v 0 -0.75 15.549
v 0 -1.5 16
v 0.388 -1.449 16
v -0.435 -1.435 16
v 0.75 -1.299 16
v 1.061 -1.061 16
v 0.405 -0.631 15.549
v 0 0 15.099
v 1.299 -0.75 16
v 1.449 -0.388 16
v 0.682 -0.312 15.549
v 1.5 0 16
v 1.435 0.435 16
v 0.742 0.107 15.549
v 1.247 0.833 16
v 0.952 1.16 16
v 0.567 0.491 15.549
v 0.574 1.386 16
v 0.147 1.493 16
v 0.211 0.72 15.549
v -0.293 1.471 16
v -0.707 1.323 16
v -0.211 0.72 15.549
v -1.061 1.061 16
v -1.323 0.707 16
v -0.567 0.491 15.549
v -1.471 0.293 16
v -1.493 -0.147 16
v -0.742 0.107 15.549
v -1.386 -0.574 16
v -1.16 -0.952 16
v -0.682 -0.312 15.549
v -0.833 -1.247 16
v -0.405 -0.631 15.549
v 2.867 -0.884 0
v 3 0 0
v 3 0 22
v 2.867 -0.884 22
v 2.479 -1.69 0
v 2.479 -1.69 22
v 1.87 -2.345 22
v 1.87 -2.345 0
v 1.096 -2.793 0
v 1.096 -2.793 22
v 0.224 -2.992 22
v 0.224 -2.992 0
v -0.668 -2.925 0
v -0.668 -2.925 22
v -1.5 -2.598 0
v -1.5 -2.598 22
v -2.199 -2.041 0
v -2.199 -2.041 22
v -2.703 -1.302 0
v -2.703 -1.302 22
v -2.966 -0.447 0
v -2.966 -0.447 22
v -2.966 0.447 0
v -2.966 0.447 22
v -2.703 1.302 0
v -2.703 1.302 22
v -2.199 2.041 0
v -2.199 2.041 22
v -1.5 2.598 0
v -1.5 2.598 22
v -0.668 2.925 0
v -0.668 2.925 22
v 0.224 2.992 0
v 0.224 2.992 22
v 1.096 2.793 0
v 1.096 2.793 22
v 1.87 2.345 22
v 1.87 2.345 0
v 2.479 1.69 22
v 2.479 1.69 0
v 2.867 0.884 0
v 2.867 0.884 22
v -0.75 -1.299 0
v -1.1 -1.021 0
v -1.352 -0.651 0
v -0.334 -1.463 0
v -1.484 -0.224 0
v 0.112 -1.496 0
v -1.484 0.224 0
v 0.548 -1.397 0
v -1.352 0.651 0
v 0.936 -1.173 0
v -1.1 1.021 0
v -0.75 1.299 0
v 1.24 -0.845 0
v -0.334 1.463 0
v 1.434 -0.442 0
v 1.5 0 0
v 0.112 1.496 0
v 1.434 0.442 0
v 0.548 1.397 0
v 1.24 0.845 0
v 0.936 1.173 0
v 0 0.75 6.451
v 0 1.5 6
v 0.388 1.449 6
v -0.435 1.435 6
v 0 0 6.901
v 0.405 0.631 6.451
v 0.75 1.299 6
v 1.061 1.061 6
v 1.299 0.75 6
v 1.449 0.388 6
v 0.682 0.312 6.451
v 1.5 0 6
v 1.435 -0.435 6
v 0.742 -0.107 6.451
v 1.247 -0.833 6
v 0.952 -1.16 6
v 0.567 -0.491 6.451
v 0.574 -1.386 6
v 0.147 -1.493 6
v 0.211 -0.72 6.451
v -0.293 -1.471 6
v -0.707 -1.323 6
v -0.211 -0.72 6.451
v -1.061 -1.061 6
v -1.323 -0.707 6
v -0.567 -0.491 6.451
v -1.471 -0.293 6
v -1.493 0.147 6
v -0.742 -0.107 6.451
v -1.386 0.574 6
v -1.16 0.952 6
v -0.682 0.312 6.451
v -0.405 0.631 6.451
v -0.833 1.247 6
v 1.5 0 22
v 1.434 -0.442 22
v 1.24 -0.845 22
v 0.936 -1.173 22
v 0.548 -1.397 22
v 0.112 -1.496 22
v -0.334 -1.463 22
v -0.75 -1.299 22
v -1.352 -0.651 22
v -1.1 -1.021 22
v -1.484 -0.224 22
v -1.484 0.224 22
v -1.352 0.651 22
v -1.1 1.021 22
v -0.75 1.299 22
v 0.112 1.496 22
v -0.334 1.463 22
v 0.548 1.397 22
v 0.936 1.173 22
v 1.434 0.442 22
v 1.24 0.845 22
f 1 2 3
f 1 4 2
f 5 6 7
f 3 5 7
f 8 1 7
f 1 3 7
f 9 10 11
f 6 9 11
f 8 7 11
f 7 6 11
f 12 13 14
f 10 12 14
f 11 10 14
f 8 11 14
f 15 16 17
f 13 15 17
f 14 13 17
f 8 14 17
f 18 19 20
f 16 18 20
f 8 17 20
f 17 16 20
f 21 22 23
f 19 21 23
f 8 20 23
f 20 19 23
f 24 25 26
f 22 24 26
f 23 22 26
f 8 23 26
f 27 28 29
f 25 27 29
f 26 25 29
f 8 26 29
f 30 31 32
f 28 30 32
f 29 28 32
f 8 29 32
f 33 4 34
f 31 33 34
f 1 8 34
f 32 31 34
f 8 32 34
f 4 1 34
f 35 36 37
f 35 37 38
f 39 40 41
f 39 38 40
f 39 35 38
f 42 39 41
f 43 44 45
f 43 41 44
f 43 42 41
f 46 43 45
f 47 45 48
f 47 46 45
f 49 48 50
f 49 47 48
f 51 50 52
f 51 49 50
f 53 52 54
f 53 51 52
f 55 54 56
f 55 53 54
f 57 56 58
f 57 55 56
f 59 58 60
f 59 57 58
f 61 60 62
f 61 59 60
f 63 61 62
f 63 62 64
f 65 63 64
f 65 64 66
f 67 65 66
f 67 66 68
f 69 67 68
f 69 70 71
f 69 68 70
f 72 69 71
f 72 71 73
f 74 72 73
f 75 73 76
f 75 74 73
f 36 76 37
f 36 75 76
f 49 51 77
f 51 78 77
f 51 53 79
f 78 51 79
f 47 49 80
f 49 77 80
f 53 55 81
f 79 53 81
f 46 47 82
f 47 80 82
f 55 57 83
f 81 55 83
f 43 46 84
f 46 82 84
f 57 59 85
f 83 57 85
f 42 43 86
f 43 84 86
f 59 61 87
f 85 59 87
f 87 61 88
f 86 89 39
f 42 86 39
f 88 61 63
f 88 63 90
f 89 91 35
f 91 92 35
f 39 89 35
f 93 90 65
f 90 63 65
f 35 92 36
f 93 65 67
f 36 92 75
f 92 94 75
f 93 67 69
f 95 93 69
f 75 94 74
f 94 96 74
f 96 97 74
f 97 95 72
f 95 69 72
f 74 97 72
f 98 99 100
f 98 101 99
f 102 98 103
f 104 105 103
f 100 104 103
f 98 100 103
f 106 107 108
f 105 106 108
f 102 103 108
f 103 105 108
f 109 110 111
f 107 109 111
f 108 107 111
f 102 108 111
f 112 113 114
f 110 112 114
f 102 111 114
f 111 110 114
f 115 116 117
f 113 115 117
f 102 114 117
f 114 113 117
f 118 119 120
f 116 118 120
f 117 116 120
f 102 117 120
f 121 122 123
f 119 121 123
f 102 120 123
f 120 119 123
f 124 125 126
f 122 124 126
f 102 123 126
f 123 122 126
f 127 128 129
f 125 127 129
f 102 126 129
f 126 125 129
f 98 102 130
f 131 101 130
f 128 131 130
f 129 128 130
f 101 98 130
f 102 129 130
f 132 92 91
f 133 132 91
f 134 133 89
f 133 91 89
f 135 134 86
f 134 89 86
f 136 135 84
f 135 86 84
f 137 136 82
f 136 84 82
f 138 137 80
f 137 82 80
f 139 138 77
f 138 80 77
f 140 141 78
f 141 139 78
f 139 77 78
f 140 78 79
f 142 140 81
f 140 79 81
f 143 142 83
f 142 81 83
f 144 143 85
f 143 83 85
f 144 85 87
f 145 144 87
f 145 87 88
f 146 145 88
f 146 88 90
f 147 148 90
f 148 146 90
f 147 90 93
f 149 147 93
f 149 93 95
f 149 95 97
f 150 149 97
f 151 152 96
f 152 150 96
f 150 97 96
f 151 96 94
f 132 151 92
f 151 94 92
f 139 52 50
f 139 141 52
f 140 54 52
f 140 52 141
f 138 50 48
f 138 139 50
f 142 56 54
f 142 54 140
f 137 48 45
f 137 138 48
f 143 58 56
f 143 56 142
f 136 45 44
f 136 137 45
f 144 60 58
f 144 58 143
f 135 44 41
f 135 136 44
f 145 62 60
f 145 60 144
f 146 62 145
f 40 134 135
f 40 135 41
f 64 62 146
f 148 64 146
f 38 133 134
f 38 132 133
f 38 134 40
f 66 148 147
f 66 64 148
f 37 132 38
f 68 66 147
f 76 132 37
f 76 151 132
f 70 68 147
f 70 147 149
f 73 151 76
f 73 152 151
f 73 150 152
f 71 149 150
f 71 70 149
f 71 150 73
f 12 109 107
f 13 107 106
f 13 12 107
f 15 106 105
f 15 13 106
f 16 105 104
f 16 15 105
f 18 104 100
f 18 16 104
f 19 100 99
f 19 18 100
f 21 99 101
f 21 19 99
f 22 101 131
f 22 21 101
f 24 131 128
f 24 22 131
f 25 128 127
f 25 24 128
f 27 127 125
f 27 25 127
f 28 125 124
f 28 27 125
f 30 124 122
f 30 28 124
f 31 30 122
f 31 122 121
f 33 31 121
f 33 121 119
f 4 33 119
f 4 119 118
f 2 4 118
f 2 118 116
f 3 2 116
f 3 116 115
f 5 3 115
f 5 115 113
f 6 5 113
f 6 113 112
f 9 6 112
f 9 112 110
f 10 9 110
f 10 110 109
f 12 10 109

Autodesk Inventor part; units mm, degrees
ref_plane "YZ Plane" through (0, 0, 0) normal (1, 0, 0) x (0, 1, 0)
ref_plane "XZ Plane" through (0, 0, 0) normal (0, 1, 0) x (-1, 0, 0)
ref_plane "XY Plane" through (0, 0, 0) normal (0, 0, 1) x (1, 0, 0)
sketch "スケッチ1" plane through (0, 0, 0) normal (0, 0, 1) x (1, 0, 0)
  circle A0 centre (0, 0) radius 3
  circle A1 centre (0, 0) radius 1.5005
  dimension "d0" = 6
  dimension "d1" = 3.001
extrude "押し出し1" add sketch "スケッチ1" along normal blind 22
sketch "スケッチ2" plane through (0, 0, 22) normal (0, 0, 1) x (1, 0, 0)
  circle A0 centre (0, 0) radius 1.5
  dimension "d4" = 3
extrude "押し出し2" add sketch "スケッチ2" against normal blind 22
hole "穴1" at (0, 0, 0) direction (0, 0, 1) diameter 3 depth 6 tip angle 118
hole "穴2" at (0, 0, 22) direction (0, 0, -1) diameter 3 depth 6 tip angle 118
properties part number "スペーサーm3-22　簡易筒型" material "アルミニウム 2014-T4"
